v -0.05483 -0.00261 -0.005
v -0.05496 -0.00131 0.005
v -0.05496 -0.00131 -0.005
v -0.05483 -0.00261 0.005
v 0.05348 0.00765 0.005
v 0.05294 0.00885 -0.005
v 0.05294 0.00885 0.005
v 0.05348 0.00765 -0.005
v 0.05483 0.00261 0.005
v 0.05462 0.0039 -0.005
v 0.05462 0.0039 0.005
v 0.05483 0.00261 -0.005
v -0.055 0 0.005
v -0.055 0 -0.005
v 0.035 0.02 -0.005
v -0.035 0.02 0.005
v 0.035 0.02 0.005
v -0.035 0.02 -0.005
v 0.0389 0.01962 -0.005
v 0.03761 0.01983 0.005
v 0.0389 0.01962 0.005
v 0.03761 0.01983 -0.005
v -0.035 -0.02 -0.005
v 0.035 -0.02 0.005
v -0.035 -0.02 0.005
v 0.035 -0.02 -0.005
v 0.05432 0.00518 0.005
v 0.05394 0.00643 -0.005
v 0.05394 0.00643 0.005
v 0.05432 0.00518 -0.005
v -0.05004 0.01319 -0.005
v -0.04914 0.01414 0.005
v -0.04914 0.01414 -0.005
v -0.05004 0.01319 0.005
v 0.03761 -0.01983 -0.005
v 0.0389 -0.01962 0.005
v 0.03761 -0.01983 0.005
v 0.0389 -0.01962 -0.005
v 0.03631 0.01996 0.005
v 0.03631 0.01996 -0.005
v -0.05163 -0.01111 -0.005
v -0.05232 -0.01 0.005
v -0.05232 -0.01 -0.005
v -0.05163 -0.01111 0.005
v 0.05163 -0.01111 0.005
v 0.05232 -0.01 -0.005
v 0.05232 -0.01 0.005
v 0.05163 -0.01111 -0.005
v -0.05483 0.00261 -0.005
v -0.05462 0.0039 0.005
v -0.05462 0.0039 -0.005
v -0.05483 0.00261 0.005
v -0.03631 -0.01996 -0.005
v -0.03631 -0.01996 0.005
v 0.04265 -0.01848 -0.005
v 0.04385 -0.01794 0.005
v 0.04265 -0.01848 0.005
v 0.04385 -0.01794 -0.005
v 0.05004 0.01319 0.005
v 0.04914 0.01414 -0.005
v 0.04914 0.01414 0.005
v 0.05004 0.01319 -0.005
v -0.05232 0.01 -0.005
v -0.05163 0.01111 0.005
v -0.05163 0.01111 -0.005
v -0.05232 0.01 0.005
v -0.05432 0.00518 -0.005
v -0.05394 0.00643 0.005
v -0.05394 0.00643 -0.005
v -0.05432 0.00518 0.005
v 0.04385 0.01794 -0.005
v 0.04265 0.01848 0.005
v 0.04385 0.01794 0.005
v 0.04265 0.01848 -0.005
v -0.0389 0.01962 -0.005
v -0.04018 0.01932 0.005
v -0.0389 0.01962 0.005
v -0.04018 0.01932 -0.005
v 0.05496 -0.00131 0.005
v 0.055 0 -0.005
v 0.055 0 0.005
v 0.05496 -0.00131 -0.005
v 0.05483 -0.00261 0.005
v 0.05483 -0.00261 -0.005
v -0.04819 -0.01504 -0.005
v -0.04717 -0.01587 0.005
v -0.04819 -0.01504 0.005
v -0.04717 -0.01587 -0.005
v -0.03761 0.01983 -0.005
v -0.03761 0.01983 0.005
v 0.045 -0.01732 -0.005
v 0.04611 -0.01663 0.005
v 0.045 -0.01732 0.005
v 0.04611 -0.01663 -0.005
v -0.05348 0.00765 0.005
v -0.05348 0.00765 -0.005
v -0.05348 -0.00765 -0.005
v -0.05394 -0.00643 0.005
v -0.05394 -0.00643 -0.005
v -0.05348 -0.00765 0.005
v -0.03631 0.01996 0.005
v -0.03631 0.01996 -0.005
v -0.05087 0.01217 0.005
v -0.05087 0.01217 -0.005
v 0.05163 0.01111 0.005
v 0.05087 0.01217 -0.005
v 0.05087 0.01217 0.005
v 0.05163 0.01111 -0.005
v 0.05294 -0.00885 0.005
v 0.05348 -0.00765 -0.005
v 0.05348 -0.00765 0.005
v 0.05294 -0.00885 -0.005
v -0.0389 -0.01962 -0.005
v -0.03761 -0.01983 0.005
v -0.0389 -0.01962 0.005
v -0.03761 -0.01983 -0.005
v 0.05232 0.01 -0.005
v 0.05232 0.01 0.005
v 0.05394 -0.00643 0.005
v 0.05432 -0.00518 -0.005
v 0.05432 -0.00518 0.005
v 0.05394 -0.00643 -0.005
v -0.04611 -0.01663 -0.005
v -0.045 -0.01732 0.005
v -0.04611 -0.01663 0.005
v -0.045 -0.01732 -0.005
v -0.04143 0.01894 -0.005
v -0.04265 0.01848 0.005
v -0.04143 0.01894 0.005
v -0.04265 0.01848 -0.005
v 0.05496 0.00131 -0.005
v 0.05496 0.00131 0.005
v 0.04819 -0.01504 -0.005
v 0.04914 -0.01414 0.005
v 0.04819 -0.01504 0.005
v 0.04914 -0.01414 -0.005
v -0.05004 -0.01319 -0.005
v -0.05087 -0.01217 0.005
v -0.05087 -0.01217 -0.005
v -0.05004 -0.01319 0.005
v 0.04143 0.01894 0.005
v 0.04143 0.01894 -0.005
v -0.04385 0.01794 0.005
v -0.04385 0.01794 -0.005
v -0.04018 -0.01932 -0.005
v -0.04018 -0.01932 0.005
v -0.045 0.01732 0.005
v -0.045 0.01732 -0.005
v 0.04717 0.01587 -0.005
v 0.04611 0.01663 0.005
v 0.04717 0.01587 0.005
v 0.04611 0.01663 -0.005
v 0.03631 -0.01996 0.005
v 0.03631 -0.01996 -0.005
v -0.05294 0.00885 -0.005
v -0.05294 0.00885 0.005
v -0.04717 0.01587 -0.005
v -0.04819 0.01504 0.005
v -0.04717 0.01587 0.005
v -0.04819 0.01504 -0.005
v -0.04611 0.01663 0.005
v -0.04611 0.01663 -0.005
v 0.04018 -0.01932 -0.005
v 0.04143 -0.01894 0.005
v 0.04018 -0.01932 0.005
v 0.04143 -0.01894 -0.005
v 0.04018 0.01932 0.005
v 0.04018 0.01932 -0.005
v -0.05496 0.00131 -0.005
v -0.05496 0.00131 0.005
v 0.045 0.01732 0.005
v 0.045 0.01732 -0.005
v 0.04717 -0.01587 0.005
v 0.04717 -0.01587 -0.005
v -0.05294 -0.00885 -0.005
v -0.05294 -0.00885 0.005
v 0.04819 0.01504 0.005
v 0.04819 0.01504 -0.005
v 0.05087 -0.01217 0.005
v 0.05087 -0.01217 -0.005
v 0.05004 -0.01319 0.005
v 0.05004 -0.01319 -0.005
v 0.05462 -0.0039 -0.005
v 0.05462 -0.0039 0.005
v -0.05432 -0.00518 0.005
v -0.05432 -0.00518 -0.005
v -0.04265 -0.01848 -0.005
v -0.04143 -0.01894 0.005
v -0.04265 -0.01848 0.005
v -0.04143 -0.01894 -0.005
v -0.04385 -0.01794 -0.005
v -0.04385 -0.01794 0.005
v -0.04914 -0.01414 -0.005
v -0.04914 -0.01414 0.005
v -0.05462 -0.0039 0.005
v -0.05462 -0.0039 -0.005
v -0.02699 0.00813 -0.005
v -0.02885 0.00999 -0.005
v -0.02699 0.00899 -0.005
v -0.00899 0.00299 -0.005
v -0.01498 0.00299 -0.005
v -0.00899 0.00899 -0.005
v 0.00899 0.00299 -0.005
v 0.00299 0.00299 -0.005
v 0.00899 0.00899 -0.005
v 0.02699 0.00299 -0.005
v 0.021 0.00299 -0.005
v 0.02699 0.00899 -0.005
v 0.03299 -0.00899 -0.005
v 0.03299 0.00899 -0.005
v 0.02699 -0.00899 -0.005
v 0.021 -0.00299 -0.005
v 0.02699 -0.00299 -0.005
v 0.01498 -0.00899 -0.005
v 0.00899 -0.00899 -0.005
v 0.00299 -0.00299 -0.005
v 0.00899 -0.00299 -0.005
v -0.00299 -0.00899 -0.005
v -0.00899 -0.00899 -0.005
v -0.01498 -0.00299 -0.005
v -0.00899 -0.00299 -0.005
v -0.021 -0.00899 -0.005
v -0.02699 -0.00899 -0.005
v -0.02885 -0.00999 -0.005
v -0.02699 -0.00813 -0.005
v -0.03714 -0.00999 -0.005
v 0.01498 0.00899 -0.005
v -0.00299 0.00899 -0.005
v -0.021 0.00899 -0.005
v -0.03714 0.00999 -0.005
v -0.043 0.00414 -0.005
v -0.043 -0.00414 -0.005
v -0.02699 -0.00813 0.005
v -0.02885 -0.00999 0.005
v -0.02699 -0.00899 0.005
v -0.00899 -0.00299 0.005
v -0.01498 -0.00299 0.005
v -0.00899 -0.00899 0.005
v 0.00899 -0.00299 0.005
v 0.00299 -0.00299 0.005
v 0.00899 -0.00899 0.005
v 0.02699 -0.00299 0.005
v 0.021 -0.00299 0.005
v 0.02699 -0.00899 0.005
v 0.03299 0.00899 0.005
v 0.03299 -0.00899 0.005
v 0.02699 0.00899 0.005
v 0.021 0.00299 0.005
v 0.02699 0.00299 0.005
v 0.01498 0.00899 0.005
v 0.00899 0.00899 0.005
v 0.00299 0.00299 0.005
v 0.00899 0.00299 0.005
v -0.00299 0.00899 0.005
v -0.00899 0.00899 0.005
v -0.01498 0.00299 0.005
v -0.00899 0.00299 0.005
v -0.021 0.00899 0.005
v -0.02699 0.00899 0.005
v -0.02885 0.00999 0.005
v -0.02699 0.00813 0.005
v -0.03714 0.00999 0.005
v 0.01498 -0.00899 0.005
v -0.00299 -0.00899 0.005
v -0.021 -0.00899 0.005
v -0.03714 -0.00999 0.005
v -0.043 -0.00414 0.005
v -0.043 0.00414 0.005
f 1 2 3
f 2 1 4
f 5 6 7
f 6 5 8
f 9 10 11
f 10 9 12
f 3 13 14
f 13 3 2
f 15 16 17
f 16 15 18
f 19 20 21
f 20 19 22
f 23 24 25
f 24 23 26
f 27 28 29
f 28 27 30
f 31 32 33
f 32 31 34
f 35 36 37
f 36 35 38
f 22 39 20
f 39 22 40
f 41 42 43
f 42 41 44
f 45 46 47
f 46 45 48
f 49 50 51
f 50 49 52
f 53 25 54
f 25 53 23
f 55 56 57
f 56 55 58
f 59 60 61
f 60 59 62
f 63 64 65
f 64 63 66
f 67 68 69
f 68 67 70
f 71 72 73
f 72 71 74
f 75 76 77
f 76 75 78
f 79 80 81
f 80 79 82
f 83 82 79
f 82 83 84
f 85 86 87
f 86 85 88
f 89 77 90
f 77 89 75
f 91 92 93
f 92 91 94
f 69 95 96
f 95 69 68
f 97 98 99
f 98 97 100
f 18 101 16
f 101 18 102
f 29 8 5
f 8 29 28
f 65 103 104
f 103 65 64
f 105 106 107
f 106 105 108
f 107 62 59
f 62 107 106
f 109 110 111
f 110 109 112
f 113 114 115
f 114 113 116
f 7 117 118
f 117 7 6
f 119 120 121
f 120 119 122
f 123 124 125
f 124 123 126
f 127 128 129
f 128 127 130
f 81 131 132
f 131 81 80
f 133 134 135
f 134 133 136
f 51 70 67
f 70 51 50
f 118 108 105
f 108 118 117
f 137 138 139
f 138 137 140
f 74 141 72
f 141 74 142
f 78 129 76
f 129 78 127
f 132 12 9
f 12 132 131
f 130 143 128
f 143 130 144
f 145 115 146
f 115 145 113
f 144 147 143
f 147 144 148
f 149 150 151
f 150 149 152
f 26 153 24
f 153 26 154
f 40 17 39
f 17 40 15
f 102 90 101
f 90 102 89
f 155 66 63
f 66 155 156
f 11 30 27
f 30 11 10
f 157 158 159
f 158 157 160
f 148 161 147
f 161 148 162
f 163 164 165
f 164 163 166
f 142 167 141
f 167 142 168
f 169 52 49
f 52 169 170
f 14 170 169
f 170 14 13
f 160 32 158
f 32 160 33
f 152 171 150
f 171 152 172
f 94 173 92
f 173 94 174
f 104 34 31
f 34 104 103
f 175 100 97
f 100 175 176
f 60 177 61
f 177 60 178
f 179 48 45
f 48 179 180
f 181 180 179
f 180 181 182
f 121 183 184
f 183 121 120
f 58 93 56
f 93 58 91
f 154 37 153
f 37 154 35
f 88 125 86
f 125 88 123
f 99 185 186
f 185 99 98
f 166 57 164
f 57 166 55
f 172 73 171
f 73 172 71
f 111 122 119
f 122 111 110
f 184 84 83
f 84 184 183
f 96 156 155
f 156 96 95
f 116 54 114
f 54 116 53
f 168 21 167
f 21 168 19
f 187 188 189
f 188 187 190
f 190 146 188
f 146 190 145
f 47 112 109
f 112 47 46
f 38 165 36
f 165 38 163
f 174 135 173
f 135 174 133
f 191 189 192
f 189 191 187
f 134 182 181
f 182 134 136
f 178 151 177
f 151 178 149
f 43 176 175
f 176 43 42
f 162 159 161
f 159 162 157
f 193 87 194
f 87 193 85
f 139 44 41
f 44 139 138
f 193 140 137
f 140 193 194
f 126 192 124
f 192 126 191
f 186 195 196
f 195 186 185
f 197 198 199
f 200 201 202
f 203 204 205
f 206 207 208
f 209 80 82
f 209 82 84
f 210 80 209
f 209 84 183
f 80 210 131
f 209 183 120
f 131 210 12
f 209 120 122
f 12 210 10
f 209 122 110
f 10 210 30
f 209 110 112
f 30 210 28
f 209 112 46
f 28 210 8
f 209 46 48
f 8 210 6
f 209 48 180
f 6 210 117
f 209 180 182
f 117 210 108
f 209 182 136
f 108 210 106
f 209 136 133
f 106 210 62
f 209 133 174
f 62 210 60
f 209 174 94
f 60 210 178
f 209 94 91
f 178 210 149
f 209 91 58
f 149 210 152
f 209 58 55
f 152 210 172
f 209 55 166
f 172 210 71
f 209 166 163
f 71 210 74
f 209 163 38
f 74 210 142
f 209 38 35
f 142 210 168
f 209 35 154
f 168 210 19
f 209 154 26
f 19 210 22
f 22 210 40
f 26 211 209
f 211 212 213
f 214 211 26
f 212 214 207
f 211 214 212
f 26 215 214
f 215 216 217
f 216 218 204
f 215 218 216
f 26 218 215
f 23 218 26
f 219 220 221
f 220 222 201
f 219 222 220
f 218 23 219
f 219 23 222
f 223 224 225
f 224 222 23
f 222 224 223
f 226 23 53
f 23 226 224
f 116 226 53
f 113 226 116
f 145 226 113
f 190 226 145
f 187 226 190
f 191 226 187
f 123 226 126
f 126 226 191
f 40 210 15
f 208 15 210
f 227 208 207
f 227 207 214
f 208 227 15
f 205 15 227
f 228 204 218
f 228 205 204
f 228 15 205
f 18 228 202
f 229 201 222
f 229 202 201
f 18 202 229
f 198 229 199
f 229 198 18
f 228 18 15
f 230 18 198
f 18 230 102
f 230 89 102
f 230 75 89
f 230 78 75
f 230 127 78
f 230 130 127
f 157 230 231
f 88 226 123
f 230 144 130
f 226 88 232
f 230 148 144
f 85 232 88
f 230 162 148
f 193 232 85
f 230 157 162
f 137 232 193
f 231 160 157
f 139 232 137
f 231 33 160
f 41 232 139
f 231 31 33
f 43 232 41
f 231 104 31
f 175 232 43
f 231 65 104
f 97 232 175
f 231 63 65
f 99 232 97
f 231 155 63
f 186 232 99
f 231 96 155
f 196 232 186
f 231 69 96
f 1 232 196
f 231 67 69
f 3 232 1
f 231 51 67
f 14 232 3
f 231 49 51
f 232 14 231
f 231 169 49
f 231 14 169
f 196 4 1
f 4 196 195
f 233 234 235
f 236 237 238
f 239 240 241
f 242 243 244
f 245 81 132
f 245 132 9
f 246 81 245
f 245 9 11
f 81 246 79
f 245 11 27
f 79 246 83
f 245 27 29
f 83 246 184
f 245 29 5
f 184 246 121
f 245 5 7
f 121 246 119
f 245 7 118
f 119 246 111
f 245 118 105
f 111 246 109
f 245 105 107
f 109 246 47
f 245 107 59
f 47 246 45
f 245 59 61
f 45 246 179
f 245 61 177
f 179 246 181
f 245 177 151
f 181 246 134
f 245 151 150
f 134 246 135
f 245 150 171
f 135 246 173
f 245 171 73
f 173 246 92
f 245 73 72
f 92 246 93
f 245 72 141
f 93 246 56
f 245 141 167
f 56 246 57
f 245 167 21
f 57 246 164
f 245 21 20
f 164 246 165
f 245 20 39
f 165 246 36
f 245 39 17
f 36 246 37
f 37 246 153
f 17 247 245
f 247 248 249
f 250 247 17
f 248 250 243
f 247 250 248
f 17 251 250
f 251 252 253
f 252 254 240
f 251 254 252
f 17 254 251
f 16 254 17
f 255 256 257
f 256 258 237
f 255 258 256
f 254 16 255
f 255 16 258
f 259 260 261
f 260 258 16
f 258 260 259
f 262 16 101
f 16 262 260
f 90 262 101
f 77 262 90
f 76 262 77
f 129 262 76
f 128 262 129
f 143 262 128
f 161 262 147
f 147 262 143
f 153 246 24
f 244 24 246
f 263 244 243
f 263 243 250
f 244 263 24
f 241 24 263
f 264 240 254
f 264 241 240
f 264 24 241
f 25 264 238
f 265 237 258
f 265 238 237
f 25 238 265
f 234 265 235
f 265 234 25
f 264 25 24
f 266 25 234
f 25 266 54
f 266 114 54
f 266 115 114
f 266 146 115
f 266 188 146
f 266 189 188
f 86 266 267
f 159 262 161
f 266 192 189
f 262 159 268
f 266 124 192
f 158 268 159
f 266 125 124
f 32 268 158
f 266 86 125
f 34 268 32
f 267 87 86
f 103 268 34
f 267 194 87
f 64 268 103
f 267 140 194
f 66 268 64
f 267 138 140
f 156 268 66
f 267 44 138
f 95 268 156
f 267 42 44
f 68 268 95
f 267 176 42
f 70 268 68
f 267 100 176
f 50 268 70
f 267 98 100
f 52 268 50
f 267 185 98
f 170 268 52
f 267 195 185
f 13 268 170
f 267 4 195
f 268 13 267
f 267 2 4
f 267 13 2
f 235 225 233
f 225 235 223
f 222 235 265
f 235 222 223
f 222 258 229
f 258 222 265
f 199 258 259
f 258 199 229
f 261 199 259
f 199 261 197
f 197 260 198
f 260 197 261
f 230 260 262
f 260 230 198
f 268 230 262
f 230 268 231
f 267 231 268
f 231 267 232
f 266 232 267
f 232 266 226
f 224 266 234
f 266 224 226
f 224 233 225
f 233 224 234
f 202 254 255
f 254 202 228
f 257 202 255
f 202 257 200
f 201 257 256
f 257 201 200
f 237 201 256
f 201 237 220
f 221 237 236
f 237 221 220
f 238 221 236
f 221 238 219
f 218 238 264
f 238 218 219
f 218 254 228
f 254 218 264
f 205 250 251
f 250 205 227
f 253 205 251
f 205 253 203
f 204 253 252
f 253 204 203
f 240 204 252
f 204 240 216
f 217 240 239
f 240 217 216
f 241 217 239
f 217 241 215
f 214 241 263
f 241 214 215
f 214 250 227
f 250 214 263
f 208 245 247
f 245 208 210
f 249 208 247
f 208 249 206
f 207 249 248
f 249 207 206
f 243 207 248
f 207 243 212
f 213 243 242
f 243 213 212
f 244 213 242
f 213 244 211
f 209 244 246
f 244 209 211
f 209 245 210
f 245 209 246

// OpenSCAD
// Thin elongated plate with rounded ends, one large octagonal through-hole near one end,
// and four evenly spaced T-shaped through-slots along the centerline.

// ---------- Parameters (mm) ----------
L = 0.11;                 // overall length
W = 0.04;                 // overall width
T = 0.01;                 // thickness (plate-like)
end_r = W/2;              // capsule ends (true rounded ends)

hole_flat_d = 0.02;       // octagon "across flats" diameter
hole_sides = 8;           // octagon
hole_offset_from_end = 0.022; // from LEFT end to hole center along X (kept consistent)

t_count = 4;
t_pitch = 0.018;          // spacing between T-slot centers
t_stem_w = 0.006;
t_stem_l = 0.012;
t_head_w = 0.018;
t_head_l = 0.006;

t_centerline_y = 0.0;
slot_layout_center_x = 0.0;

overlap = 0.001;          // ensures clean through-cuts

$fn = 96;

// ---------- Helpers ----------
module capsule_plate_2d(len, wid, r) {
    // 2D capsule using hull of two circles; r should be wid/2 for true rounded ends
    hull() {
        translate([-(len/2 - r), 0]) circle(r=r);
        translate([ (len/2 - r), 0]) circle(r=r);
    }
}

module octagon_2d(flat_d, sides=8) {
    // Across-flats = 2*apothem = 2*R*cos(pi/n) => R = flat_d/(2*cos(pi/n))
    R = flat_d / (2*cos(180/sides));
    rotate(180/sides) circle(r=R, $fn=sides);
}

module t_slot_2d() {
    // T shape centered at origin, stem along +X, head at +X end of stem
    union() {
        square([t_stem_l, t_stem_w], center=true);
        translate([t_stem_l/2 - t_head_l/2, 0])
            square([t_head_l, t_head_w], center=true);
    }
}

module t_slots_2d(count, pitch, center_x=0, y=0) {
    for (i = [0:count-1]) {
        x = center_x + (i - (count-1)/2) * pitch;
        translate([x, y]) t_slot_2d();
    }
}

// ---------- Model ----------
module plate_solid() {
    linear_extrude(height=T, center=true)
        capsule_plate_2d(L, W, end_r);
}

module cutouts() {
    linear_extrude(height=T + 2*overlap, center=true) {
        // Large octagonal hole near LEFT end (fixed orientation/placement)
        translate([-(L/2) + hole_offset_from_end, 0])
            octagon_2d(hole_flat_d, hole_sides);

        // Four repeated T-shaped slots along centerline
        translate([0, t_centerline_y])
            t_slots_2d(t_count, t_pitch, slot_layout_center_x, 0);
    }
}

difference() {
    plate_solid();
    cutouts();
}
